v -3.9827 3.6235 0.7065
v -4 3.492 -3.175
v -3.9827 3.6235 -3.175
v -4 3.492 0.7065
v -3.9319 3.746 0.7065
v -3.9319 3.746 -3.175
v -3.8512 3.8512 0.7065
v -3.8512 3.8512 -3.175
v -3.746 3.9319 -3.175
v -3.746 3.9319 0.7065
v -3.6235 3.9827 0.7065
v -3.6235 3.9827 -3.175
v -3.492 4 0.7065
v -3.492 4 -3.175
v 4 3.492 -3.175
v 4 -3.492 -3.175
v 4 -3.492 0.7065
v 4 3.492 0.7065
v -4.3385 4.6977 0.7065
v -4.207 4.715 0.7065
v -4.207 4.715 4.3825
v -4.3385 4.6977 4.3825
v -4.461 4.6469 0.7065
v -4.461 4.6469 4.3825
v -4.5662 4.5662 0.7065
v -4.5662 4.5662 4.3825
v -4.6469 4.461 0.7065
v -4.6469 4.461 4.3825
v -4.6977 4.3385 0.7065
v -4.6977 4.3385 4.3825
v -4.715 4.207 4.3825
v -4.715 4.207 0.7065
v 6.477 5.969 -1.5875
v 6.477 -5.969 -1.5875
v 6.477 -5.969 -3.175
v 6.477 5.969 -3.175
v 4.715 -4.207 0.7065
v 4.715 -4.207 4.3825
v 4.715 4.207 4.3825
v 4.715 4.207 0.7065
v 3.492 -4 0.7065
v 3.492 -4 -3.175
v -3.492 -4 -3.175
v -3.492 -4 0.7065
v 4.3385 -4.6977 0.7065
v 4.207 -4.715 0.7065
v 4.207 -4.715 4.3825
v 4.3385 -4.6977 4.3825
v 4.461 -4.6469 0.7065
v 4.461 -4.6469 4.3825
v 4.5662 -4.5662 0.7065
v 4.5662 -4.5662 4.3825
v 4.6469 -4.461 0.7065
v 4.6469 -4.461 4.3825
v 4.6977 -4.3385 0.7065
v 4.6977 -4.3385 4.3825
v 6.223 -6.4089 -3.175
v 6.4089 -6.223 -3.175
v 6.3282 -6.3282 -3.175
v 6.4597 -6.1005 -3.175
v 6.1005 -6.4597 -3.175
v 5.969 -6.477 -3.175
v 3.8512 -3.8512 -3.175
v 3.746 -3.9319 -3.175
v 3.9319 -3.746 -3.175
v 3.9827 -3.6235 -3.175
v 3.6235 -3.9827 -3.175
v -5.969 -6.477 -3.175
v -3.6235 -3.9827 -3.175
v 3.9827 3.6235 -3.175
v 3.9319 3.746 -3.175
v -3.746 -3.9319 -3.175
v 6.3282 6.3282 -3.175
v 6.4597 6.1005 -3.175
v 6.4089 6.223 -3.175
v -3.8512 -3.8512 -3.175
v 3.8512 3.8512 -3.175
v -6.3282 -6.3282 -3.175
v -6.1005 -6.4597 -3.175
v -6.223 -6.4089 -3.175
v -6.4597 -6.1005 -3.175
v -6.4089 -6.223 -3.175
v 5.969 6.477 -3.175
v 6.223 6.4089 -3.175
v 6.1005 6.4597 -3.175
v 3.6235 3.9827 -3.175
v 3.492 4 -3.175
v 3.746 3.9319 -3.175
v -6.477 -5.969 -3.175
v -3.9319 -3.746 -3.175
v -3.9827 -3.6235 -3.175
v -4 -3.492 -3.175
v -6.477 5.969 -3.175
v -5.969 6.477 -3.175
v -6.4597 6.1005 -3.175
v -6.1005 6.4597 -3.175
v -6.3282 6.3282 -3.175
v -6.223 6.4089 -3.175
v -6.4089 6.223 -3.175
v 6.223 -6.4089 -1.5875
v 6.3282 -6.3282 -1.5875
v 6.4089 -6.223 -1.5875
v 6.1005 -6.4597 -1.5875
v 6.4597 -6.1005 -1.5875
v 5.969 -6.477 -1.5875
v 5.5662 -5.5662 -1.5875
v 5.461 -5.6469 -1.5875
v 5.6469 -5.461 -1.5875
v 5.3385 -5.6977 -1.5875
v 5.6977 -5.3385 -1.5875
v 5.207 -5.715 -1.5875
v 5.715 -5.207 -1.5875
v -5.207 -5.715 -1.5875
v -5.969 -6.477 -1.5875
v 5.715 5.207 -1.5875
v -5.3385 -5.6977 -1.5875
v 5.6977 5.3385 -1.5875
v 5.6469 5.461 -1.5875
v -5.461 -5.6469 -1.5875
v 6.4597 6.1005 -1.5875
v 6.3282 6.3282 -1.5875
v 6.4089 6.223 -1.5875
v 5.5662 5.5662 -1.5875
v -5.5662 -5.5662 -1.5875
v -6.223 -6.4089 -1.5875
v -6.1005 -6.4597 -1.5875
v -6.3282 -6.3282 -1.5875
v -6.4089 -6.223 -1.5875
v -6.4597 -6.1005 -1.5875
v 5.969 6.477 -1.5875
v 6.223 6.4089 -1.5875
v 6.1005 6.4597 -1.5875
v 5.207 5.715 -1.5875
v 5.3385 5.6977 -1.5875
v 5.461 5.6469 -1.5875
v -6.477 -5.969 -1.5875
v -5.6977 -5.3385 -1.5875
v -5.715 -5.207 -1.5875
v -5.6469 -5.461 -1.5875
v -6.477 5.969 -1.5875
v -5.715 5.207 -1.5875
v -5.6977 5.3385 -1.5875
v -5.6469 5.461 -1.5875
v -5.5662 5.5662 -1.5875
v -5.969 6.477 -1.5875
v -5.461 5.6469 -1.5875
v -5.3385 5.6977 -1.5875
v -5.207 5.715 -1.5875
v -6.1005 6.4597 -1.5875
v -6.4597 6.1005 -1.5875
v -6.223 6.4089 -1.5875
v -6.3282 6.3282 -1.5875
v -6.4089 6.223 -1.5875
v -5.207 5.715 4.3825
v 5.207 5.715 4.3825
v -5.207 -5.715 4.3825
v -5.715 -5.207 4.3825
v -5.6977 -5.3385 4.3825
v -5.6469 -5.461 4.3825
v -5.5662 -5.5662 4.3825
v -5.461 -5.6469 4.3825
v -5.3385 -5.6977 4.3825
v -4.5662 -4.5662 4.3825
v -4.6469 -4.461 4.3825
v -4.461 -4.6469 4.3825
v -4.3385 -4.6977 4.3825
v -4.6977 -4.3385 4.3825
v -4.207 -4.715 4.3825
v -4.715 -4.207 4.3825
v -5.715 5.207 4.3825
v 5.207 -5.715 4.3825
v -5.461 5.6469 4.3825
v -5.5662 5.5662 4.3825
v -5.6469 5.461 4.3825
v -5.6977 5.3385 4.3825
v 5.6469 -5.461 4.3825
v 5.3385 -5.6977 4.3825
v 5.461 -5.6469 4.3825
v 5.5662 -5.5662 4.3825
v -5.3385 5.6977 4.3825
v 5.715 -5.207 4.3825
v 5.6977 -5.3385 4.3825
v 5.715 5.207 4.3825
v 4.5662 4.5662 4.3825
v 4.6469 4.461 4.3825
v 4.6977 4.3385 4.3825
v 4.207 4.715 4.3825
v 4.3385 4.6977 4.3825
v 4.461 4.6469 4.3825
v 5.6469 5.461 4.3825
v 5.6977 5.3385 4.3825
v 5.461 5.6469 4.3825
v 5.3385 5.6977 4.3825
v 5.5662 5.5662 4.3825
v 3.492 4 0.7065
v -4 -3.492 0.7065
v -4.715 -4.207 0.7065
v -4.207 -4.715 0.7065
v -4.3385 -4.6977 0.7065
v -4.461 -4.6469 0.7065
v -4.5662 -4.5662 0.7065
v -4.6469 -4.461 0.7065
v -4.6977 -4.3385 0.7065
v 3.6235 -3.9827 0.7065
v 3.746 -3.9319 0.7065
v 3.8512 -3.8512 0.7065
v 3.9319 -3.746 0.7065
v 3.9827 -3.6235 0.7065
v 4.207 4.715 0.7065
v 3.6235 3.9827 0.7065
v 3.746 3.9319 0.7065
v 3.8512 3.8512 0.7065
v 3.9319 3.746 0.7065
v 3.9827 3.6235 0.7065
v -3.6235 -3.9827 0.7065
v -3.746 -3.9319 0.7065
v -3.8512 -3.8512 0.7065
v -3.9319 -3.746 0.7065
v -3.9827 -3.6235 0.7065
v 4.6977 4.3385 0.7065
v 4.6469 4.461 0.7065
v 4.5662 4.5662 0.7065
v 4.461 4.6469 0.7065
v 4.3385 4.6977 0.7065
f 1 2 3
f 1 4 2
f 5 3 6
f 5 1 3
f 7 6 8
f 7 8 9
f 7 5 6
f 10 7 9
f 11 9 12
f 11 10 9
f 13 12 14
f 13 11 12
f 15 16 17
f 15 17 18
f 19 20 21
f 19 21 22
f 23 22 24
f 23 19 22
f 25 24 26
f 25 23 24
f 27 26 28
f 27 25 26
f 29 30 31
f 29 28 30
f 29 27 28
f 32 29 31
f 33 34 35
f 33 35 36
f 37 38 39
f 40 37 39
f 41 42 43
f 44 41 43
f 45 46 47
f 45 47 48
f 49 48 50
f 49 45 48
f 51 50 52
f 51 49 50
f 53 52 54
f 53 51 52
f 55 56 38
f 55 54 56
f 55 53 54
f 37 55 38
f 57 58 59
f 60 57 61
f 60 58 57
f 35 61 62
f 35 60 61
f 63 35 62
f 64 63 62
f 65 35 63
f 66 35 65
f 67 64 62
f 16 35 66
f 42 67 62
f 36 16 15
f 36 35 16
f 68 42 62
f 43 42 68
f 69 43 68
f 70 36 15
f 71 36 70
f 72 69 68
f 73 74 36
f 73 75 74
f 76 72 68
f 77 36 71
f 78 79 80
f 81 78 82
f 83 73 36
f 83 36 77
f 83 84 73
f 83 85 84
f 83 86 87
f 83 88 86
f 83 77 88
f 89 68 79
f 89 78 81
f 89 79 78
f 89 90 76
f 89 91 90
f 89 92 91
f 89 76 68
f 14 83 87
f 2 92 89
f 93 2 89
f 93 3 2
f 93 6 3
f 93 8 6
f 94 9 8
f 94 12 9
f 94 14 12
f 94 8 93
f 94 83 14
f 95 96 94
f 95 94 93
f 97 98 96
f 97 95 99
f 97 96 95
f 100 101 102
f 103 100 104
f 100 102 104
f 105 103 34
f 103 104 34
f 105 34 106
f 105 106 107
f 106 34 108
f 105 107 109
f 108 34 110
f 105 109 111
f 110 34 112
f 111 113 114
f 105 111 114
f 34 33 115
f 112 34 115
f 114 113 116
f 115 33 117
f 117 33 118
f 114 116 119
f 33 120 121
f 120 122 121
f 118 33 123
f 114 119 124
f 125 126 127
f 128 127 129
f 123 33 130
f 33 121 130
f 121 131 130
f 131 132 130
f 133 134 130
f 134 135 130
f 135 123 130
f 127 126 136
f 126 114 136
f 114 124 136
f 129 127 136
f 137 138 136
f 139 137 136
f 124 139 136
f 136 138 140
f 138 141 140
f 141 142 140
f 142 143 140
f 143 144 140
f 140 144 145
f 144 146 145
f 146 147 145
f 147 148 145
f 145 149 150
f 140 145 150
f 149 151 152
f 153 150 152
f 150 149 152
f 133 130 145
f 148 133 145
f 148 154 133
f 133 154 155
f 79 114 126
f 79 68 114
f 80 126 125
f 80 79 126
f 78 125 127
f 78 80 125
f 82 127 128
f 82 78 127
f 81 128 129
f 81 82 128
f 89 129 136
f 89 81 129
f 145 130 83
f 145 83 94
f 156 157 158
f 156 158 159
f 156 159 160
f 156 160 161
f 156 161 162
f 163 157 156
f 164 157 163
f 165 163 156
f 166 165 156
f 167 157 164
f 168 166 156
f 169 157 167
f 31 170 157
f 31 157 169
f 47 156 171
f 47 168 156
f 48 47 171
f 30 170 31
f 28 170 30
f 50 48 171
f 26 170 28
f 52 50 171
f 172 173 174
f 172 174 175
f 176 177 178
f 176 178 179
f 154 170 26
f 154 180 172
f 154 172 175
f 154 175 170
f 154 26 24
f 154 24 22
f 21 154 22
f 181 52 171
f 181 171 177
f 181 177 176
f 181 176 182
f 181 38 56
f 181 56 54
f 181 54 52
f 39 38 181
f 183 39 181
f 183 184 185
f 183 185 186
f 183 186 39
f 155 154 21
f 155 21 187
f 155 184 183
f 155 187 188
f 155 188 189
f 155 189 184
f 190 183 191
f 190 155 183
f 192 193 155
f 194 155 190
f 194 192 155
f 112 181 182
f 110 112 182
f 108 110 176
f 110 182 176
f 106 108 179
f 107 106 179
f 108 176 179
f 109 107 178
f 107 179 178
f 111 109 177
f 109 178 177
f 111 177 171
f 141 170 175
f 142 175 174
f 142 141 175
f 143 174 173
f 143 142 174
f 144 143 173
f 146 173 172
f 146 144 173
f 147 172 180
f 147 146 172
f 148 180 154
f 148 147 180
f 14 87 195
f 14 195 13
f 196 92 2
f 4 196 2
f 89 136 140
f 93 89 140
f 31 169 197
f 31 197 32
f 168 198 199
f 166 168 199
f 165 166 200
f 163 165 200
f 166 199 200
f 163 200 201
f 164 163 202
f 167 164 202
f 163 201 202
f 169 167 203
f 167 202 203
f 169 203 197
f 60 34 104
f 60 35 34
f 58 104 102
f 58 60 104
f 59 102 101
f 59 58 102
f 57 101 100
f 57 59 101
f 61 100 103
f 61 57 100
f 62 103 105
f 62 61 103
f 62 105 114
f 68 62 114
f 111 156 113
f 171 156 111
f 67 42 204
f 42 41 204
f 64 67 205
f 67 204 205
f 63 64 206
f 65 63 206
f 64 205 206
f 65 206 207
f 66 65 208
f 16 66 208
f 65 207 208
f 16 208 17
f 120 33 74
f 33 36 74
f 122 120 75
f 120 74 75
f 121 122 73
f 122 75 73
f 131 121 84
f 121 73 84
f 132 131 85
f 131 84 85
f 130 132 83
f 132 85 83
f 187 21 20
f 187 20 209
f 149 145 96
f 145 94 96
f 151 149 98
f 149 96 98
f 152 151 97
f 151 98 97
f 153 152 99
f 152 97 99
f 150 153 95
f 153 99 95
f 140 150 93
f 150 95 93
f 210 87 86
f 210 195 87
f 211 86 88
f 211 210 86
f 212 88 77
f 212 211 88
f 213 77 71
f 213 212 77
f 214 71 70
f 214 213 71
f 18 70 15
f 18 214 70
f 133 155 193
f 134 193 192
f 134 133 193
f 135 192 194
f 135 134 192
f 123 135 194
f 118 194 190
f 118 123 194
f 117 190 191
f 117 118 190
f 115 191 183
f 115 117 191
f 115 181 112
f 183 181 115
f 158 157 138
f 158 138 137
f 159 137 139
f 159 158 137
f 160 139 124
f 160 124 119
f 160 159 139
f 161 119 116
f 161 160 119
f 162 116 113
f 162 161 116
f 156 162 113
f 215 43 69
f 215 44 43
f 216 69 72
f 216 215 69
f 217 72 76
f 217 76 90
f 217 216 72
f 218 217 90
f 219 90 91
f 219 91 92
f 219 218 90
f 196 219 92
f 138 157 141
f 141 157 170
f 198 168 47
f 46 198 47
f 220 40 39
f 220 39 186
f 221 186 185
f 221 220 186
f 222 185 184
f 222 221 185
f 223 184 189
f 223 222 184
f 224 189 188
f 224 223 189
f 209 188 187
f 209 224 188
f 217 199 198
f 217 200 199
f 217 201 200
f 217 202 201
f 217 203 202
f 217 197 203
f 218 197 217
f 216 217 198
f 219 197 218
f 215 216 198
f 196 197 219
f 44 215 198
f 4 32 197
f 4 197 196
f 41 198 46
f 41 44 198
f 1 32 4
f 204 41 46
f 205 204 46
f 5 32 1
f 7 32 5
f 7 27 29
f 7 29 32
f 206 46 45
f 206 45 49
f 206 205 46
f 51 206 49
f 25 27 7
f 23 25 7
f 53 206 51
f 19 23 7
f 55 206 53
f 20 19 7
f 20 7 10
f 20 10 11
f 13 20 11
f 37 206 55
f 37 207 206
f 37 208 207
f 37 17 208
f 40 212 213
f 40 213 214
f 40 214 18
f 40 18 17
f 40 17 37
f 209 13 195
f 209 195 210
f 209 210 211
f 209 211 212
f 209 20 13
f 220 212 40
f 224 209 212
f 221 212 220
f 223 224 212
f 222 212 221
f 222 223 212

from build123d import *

# Parameters (mm, degrees)
SKETCH1_W                = 11.43
SKETCH1_H                = 11.43
BOSS_EXTRUDE1_DEPTH      = 4.7625
BOSS_EXTRUDE1_DEPTH_BACK = 1.5875
SKETCH2_W                = 12.954
SKETCH2_H                = 12.954
BOSS_EXTRUDE2_DEPTH      = 1.5875
SKETCH23_W               = 4.099999912
SKETCH23_H               = 3.500000096
CUT_EXTRUDE5_DEPTH       = 8.9375
SKETCH24_W               = 6.254
SKETCH24_H               = 4.754
CUT_EXTRUDE6_DEPTH       = 4.15
SKETCH25_W               = 9.43
SKETCH25_H               = 9.43
CUT_EXTRUDE7_DEPTH       = 4.056
SKETCH26_W               = 8
SKETCH26_H               = 8
CUT_EXTRUDE8_DEPTH       = 8.9375
FILLET7_R                = 0.508
CUT_EXTRUDE9_DEPTH       = 0.38


with BuildPart() as part:
    # Sketch1 → Boss-Extrude1 (new body, two sides)
    with BuildSketch(Plane.XY) as boss_extrude1_sk:
        Rectangle(SKETCH1_W, SKETCH1_H)
    extrude(amount=BOSS_EXTRUDE1_DEPTH)
    extrude(boss_extrude1_sk.sketch, amount=-BOSS_EXTRUDE1_DEPTH_BACK)

    # Sketch2 → Boss-Extrude2 (add)
    with BuildSketch(Plane(origin=(0, 0, -1.5875), x_dir=(-1, 0, 0), z_dir=(0, 0, -1))):
        Rectangle(SKETCH2_W, SKETCH2_H)
    extrude(amount=BOSS_EXTRUDE2_DEPTH)

    # Sketch23 → Cut-Extrude5 (cut, through all)
    with BuildSketch(Plane.XY.offset(4.7625)):
        Rectangle(SKETCH23_W, SKETCH23_H)
    extrude(amount=-CUT_EXTRUDE5_DEPTH, mode=Mode.SUBTRACT)

    # Sketch24 → Cut-Extrude6 (cut)
    with BuildSketch(Plane(origin=(0, 0, -3.175), x_dir=(-1, 0, 0), z_dir=(0, 0, -1))):
        Rectangle(SKETCH24_W, SKETCH24_H)
    extrude(amount=-CUT_EXTRUDE6_DEPTH, mode=Mode.SUBTRACT)

    # Sketch25 → Cut-Extrude7 (cut)
    with BuildSketch(Plane.XY.offset(4.7625)):
        Rectangle(SKETCH25_W, SKETCH25_H)
    extrude(amount=-CUT_EXTRUDE7_DEPTH, mode=Mode.SUBTRACT)

    # Sketch26 → Cut-Extrude8 (cut, through all)
    with BuildSketch(Plane(origin=(0, 0, -3.175), x_dir=(-1, 0, 0), z_dir=(0, 0, -1))):
        Rectangle(SKETCH26_W, SKETCH26_H)
    extrude(amount=-CUT_EXTRUDE8_DEPTH, mode=Mode.SUBTRACT)

    # Fillet7
    fillet7_edges = [part.edges().sort_by_distance(p)[0] for p in [
        (4, -4, -1.23425),
        (4, 4, -1.23425),
        (-4, 4, -1.23425),
        (-4, -4, -1.23425),
        (-6.477, 6.477, -2.38125),
        (6.477, 6.477, -2.38125),
        (6.477, -6.477, -2.38125),
        (-6.477, -6.477, -2.38125),
        (5.715, -5.715, 1.5875),
        (-5.715, -5.715, 1.5875),
        (-5.715, 5.715, 1.5875),
        (5.715, 5.715, 1.5875),
        (4.715, 4.715, 2.7345),
        (4.715, -4.715, 2.7345),
        (-4.715, -4.715, 2.7345),
        (-4.715, 4.715, 2.7345),
    ]]
    fillet(fillet7_edges, radius=FILLET7_R)

    # Sketch27 → Cut-Extrude9 (cut)
    with BuildSketch(Plane.XY.offset(4.7625)):
        with BuildLine():
            Line((-5.715, 5.207), (-5.715, -5.207))
            ThreePointArc((-5.715, -5.207), (-5.566210245, -5.566210245), (-5.207, -5.715))
            Line((-5.207, -5.715), (5.207, -5.715))
            ThreePointArc((5.207, -5.715), (5.566210245, -5.566210245), (5.715, -5.207))
            Line((5.715, -5.207), (5.715, 5.207))
            ThreePointArc((5.715, 5.207), (5.566210245, 5.566210245), (5.207, 5.715))
            Line((5.207, 5.715), (-5.207, 5.715))
            ThreePointArc((-5.207, 5.715), (-5.566210245, 5.566210245), (-5.715, 5.207))
        make_face()
    extrude(amount=-CUT_EXTRUDE9_DEPTH, mode=Mode.SUBTRACT)


solid = part.part
